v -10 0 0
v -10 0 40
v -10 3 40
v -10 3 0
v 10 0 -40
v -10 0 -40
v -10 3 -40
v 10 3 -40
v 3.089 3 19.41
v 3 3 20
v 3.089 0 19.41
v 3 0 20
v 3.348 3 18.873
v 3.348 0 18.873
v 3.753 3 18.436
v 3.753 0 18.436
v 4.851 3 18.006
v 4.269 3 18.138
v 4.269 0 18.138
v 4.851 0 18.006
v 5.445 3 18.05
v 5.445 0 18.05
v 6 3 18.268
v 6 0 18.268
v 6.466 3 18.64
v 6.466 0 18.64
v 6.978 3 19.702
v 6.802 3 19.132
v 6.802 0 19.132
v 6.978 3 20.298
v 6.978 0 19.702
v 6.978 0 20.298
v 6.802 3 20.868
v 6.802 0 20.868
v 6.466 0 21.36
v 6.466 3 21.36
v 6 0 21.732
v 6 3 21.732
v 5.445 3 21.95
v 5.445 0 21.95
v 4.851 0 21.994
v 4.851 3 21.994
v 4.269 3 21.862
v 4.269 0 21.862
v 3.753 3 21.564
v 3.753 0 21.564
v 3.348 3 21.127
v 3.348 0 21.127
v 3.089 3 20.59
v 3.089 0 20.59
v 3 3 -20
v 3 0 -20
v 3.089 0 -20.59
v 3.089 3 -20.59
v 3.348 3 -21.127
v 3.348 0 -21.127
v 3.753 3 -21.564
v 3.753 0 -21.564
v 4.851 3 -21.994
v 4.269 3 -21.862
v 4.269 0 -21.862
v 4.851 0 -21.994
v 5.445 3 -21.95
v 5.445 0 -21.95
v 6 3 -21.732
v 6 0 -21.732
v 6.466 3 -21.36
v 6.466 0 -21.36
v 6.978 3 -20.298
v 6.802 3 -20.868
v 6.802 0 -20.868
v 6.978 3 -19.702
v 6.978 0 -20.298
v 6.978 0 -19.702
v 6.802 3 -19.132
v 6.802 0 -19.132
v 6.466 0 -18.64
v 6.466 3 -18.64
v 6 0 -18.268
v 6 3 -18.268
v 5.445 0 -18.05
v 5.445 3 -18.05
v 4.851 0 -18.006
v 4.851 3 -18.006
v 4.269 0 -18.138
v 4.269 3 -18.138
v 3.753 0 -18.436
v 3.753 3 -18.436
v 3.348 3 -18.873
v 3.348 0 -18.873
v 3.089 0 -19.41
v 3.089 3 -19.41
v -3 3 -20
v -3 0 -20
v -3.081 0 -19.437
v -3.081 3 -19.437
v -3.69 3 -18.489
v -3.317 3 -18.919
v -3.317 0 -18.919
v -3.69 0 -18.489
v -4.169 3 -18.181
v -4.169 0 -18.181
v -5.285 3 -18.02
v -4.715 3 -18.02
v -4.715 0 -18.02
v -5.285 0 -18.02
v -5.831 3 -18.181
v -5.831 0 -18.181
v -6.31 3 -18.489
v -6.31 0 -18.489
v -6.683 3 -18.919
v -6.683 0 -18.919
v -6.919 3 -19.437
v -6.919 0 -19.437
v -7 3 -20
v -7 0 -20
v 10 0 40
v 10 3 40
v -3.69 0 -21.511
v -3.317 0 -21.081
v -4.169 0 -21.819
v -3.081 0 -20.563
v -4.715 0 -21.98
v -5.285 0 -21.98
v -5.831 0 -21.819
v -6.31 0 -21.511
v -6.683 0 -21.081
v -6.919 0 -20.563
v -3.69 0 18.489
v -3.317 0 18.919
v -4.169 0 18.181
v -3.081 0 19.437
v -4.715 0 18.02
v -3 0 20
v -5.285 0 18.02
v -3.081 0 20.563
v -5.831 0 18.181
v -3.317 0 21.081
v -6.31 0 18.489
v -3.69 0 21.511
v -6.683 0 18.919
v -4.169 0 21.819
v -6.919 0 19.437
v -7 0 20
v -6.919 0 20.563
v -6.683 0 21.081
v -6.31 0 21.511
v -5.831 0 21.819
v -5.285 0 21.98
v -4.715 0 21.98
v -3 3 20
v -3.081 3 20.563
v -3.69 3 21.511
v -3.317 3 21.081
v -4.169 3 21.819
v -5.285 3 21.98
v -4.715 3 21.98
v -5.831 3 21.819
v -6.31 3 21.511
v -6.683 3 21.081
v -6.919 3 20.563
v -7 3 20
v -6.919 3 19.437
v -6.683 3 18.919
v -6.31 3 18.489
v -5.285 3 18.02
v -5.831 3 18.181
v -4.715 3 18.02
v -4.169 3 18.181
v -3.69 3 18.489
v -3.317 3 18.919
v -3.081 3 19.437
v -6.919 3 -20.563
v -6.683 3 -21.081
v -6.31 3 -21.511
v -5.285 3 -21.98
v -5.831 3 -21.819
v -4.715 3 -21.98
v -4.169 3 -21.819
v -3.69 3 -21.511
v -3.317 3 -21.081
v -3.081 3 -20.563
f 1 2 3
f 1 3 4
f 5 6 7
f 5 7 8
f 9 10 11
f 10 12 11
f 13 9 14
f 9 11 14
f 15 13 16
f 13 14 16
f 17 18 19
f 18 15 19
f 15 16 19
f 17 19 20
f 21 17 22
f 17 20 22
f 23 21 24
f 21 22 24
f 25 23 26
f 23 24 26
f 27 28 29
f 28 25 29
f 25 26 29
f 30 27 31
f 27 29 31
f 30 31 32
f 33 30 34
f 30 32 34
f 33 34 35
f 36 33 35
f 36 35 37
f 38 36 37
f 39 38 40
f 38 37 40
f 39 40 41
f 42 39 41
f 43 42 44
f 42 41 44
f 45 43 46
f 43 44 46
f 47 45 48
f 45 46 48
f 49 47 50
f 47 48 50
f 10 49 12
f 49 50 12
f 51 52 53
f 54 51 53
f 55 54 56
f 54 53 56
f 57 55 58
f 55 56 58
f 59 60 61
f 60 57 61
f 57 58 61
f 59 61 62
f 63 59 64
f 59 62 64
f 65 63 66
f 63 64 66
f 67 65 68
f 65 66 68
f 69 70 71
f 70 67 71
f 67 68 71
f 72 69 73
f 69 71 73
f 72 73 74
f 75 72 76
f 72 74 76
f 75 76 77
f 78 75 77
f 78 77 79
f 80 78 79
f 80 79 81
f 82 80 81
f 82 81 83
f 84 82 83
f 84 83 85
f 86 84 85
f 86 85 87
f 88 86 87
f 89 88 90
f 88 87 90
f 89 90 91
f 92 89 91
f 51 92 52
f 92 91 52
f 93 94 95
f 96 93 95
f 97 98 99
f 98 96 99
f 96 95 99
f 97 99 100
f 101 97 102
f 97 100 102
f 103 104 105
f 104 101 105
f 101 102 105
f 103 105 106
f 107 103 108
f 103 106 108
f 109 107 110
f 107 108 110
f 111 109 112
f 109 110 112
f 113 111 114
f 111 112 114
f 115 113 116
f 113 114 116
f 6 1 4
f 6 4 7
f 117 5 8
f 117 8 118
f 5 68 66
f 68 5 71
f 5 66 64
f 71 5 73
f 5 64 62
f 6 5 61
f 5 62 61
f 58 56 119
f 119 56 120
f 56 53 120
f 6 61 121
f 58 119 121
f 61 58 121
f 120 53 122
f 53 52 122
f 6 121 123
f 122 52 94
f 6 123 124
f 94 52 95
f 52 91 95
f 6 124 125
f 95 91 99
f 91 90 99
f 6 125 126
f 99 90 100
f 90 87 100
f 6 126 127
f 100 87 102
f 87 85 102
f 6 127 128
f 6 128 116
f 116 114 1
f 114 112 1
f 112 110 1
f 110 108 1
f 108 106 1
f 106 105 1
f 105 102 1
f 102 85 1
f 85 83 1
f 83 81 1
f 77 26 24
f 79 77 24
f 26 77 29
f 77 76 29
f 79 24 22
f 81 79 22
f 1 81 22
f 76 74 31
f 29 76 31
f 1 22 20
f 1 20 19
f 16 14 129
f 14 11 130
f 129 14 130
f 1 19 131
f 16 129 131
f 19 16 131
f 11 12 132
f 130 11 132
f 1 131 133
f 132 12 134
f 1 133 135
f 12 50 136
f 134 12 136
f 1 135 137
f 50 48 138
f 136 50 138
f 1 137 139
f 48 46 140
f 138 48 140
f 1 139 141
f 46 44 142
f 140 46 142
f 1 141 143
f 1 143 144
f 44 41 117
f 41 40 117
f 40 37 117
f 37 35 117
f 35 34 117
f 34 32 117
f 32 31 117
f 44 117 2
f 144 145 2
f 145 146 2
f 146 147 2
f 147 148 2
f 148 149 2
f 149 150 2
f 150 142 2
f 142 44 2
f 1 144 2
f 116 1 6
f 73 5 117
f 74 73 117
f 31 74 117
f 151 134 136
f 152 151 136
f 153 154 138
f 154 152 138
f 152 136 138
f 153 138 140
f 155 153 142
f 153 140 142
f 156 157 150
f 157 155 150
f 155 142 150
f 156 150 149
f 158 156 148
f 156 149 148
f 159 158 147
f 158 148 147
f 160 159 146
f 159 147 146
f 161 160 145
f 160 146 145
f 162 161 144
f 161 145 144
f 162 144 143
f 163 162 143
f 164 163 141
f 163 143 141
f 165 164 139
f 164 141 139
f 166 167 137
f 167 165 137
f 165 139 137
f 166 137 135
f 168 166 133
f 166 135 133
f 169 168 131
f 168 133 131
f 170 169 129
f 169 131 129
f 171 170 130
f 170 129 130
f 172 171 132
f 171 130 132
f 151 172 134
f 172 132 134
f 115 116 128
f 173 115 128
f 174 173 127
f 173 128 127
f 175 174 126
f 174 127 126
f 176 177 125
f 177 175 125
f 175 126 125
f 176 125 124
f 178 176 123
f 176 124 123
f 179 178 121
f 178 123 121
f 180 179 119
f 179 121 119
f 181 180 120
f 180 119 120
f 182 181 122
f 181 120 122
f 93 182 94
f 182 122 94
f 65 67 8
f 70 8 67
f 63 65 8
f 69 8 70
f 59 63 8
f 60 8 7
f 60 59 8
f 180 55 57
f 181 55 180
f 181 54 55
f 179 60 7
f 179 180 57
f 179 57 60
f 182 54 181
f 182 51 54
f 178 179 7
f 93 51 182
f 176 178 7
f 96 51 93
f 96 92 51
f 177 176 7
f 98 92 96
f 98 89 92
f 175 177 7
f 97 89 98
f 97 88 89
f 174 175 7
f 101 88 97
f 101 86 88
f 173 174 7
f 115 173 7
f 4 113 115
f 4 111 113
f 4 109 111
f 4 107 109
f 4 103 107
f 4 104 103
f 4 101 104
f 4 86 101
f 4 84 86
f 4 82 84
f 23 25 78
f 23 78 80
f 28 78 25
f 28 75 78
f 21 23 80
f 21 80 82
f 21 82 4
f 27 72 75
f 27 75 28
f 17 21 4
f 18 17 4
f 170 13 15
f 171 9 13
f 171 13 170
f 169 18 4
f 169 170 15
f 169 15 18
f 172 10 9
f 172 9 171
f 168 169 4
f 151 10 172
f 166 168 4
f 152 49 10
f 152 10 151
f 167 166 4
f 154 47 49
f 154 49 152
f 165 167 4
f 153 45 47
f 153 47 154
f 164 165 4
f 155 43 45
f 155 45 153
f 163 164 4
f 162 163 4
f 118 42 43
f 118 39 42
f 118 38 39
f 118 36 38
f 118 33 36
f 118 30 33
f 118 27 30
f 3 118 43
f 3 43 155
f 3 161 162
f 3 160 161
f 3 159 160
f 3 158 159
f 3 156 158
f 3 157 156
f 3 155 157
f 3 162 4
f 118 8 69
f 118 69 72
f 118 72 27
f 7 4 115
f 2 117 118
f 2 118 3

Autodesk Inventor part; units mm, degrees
ref_plane "YZ Plane" through (0, 0, 0) normal (1, 0, 0) x (0, 1, 0)
ref_plane "XZ Plane" through (0, 0, 0) normal (0, 1, 0) x (-1, 0, 0)
ref_plane "XY Plane" through (0, 0, 0) normal (0, 0, 1) x (1, 0, 0)
sketch "Boceto1" plane through (0, 0, 0) normal (0, 1, 0) x (-1, 0, 0)
  line L0 (10, 0) -> (10, -40)
  line L1 (10, -40) -> (-10, -40)
  line L2 (-10, -40) -> (-10, 40)
  line L3 (-10, 40) -> (10, 40)
  line L4 (10, 40) -> (10, 0)
  line L5 (0, 0) -> (0, 20)
  line L6 (0, 20) -> (5, 20)
  line L7 (0, 0) -> (0, -20)
  line L8 (0, -20) -> (5, -20)
  line L9 (0, 20) -> (-5, 20)
  line L10 (0, -20) -> (-5, -20)
  circle A0 centre (5, 20) radius 2
  circle A1 centre (5, -20) radius 2
  circle A2 centre (-5, -20) radius 2
  circle A3 centre (-5, 20) radius 2
  dimension "d1" = 40
  dimension "d2" = 20
  dimension "d3" = 80
  dimension "d5" = 20
  dimension "d6" = 5
  dimension "d7" = 20
  dimension "d8" = 5
  dimension "d9" = 5
  dimension "d10" = 4
  dimension "d11" = 4
  dimension "d12" = 4
  dimension "d13" = 4
extrude "Extrusión1" add sketch "Boceto1" along normal blind 3
equation "\"Radio_pliegue\" = Grosor"
equation "\"Anchura_desahogo_plegado\" = Grosor"
equation "\"Profundidad_desahogo_plegado\" = 0.5 * Grosor"
equation "\"Tamaño_destalonado\" = 4 * Grosor"
equation "\"Remanente_mínimo\" = 2 * Grosor"
equation "\"Radiodetransición\" = Radio_pliegue"
equation "\"Tamaño_de_radio_de_Jacobi\" = Radio_pliegue"
equation "\"TamañoSeparación\" = Grosor"
equation "\"Grosor\" = 0.5"
properties part number "Soporte_Techo"
